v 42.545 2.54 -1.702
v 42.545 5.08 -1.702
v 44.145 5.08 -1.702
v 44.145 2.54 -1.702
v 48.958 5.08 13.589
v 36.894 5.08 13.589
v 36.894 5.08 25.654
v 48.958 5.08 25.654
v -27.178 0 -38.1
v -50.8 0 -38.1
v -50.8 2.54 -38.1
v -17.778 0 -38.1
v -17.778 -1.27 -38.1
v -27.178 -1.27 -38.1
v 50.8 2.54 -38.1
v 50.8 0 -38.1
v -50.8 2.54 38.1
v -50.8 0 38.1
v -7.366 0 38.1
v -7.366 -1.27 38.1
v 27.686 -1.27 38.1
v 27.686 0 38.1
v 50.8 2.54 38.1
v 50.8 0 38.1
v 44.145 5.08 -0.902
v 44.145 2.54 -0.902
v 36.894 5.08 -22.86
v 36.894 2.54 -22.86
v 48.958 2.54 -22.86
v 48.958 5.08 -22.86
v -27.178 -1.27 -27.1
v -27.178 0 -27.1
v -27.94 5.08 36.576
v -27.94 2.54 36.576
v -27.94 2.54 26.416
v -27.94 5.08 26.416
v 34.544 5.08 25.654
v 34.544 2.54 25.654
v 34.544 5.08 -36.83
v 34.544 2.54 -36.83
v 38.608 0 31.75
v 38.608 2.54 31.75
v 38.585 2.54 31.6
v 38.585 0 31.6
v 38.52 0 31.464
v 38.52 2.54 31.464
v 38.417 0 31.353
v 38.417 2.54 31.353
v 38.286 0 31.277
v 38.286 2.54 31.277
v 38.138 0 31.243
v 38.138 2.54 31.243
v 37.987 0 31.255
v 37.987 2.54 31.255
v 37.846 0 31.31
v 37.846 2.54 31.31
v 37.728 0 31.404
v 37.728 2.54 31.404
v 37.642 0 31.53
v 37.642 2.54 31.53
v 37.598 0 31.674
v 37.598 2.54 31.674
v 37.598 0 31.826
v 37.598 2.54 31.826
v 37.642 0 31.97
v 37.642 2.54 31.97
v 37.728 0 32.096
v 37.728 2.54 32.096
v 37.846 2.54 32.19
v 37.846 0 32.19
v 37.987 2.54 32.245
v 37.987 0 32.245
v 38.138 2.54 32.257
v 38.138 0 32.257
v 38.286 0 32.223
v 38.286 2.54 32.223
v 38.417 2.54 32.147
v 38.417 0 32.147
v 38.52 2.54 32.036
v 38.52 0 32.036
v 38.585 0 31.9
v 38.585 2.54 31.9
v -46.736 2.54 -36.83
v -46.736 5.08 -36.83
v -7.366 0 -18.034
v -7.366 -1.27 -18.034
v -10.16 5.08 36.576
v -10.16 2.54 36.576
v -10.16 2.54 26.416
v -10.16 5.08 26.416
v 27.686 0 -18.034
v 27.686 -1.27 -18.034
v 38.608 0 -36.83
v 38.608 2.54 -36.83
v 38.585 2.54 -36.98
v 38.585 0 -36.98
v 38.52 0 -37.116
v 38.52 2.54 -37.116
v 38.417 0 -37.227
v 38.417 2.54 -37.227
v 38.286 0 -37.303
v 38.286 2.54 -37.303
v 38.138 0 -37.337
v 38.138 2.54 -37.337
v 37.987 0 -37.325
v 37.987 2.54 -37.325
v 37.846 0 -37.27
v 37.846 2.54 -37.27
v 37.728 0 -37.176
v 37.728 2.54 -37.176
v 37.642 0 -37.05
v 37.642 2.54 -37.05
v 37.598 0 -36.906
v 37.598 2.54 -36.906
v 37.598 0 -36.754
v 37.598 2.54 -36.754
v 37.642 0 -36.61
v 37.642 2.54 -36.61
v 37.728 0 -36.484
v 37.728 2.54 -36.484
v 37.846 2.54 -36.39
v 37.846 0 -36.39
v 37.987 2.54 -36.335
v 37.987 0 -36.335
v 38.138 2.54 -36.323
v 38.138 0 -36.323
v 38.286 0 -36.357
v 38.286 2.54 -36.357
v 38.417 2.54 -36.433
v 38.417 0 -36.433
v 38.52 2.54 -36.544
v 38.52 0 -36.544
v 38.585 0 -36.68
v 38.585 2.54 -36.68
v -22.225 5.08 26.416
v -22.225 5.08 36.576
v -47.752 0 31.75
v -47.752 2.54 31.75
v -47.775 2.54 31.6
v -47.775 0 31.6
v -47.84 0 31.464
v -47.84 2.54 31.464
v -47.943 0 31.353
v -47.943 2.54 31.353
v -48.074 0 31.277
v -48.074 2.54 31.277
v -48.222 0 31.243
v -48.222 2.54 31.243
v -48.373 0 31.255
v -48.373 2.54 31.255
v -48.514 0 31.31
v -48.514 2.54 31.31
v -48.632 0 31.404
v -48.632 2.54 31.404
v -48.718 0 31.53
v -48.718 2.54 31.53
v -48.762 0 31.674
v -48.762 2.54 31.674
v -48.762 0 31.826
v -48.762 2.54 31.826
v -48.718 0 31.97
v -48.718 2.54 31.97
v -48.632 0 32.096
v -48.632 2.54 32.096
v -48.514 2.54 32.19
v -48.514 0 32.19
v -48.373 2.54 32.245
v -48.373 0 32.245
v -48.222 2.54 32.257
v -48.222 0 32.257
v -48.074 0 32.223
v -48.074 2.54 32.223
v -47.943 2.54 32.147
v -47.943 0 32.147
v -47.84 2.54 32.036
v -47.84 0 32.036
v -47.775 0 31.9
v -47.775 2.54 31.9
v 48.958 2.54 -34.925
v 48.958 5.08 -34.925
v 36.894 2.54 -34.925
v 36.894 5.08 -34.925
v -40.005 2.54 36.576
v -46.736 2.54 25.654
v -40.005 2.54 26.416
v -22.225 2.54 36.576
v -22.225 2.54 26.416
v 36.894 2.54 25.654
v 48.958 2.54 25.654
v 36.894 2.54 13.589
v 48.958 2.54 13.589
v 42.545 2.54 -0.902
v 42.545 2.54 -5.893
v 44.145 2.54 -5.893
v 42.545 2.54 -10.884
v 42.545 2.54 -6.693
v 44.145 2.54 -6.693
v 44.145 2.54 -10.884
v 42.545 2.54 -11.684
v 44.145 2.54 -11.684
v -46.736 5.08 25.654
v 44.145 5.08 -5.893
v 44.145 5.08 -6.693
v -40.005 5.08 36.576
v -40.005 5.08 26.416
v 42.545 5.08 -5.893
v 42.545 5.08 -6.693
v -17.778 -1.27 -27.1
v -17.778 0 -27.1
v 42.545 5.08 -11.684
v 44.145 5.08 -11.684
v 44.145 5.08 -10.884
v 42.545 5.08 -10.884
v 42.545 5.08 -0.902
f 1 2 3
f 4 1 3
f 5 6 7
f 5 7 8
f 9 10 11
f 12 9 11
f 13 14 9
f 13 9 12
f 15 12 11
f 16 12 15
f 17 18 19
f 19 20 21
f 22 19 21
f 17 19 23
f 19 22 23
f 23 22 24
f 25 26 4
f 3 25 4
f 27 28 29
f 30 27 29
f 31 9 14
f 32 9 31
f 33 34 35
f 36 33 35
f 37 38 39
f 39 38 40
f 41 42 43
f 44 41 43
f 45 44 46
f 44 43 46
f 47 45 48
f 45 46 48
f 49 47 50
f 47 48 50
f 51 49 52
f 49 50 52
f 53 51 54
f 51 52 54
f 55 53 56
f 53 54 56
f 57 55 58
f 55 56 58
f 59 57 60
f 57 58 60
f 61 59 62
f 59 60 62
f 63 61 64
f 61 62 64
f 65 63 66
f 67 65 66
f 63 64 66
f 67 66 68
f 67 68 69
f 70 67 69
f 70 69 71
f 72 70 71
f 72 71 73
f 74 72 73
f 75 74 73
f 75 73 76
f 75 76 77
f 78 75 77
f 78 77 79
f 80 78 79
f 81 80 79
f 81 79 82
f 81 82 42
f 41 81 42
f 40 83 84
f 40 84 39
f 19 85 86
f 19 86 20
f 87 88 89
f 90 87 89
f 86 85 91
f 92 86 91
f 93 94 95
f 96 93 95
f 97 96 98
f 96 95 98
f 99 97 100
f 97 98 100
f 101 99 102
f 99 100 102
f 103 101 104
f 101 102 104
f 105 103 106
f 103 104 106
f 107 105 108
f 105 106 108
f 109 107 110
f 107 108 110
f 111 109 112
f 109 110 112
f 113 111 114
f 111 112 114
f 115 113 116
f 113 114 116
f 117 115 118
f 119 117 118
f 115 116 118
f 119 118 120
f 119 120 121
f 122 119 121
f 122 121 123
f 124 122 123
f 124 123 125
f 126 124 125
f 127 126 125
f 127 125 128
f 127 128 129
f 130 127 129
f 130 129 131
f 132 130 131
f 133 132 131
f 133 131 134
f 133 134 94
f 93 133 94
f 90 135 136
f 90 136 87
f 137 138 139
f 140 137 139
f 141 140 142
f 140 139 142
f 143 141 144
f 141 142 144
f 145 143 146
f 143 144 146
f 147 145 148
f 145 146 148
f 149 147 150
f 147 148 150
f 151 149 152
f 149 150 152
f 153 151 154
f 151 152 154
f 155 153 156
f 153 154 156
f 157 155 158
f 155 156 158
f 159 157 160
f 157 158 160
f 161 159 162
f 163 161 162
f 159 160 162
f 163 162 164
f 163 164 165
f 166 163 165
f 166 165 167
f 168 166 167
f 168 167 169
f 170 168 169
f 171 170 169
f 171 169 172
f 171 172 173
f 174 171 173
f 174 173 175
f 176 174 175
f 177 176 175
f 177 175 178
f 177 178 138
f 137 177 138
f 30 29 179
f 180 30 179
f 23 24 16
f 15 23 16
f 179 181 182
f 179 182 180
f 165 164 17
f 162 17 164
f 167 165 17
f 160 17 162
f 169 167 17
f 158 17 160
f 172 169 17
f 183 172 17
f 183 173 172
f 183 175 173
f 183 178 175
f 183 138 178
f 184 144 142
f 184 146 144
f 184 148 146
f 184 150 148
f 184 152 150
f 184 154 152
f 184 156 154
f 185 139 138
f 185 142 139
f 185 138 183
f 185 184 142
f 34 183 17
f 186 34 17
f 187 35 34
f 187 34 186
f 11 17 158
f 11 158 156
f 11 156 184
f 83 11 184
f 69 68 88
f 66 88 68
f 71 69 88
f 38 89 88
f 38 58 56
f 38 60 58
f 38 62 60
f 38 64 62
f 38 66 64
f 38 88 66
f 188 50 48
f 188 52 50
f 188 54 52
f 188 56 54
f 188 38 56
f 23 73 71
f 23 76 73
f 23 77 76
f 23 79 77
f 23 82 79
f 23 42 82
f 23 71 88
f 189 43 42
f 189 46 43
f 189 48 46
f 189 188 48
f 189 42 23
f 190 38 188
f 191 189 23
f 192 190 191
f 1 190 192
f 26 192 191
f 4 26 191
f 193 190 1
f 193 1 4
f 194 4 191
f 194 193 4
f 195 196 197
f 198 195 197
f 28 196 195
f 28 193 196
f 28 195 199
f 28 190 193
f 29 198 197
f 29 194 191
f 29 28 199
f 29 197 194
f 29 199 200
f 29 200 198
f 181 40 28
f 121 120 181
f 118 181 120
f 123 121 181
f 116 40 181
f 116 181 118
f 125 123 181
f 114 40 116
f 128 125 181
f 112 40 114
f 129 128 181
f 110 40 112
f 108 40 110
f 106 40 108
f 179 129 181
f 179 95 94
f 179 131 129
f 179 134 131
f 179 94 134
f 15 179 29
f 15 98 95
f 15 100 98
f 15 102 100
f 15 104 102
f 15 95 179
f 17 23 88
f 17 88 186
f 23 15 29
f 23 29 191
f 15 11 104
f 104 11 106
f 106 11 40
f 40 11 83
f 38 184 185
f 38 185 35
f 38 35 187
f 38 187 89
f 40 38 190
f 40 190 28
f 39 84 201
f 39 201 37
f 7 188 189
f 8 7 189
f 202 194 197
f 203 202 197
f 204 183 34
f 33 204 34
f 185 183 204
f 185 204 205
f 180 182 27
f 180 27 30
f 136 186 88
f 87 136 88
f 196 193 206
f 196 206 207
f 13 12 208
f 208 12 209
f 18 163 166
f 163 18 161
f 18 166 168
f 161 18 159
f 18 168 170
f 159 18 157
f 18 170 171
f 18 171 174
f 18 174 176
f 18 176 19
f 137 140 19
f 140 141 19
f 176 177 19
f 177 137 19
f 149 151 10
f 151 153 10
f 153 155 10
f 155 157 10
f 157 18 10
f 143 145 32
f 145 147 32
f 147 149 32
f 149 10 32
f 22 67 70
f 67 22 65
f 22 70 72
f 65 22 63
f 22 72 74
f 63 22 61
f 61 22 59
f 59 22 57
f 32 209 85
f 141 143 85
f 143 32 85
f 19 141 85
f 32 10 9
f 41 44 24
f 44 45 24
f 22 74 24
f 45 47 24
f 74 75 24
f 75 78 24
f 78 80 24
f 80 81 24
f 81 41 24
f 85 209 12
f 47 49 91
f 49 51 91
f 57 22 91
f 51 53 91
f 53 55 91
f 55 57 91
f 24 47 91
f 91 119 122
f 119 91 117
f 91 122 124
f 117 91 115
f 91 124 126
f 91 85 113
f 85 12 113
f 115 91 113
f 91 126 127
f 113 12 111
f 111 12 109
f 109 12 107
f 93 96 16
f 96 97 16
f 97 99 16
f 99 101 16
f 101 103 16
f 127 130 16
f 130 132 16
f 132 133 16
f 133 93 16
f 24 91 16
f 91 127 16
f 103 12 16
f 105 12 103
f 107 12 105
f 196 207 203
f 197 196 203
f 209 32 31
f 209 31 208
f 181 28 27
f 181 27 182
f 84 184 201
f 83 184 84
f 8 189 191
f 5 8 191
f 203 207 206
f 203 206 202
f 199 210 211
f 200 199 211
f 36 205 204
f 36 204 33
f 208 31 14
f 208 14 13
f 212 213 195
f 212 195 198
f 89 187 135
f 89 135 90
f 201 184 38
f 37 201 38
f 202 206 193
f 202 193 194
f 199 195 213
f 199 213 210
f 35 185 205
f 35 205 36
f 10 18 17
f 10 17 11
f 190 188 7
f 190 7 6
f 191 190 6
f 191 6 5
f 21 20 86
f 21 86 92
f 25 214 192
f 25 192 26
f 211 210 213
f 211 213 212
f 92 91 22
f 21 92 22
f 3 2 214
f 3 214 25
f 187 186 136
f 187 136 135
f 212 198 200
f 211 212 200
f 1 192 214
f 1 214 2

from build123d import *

# Parameters (mm, degrees)
SKETCH1_W           = 101.6
SKETCH1_H           = 76.2
BOSS_EXTRUDE1_DEPTH = 2.54
SKETCH3_W           = 35.052
SKETCH3_H           = 56.134
SKETCH3_W_2         = 9.4
SKETCH3_H_2         = 11
BOSS_EXTRUDE4_DEPTH = 1.27
SKETCH2_W           = 1.6
SKETCH2_H           = 0.8
SKETCH2_W_2         = 81.28
SKETCH2_H_2         = 62.484
SKETCH2_W_3         = 12.065
SKETCH2_H_3         = 12.065
SKETCH2_H_4         = 10.16
BOSS_EXTRUDE5_DEPTH = 2.54
SKETCH2_3_R         = 0.508
CUT_EXTRUDE1_DEPTH  = 64.614197315


with BuildPart() as part:
    # Sketch1 → Boss-Extrude1 (new body)
    with BuildSketch(Plane(origin=(0, 0, 0), x_dir=(1, 0, 0), z_dir=(0, 1, 0))):
        Rectangle(SKETCH1_W, SKETCH1_H)
    extrude(amount=BOSS_EXTRUDE1_DEPTH)

    # Sketch3 → Boss-Extrude4 (add)
    with BuildSketch(Plane.XZ):
        with Locations((10.16, 10.033)):
            Rectangle(SKETCH3_W, SKETCH3_H)
        with Locations((-22.478, -32.6)):
            Rectangle(SKETCH3_W_2, SKETCH3_H_2)
    extrude(amount=BOSS_EXTRUDE4_DEPTH)

    # Sketch2 → Boss-Extrude5 (add)
    with BuildSketch(Plane(origin=(0, 2.54, 0), x_dir=(1, 0, 0), z_dir=(0, 1, 0))):
        with Locations((43.345, 6.293)):
            Rectangle(SKETCH2_W, SKETCH2_H)
        with Locations((-6.096, 5.588)):
            Rectangle(SKETCH2_W_2, SKETCH2_H_2)
        with Locations((42.926, 28.8925)):
            Rectangle(SKETCH2_W_3, SKETCH2_H_3)
        with Locations((42.926, -19.6215)):
            Rectangle(SKETCH2_W_3, SKETCH2_H_3)
        with Locations((43.345, 1.302)):
            Rectangle(SKETCH2_W, SKETCH2_H)
        with Locations((43.345, 11.284)):
            Rectangle(SKETCH2_W, SKETCH2_H)
        with Locations((-33.9725, -31.496)):
            Rectangle(SKETCH2_W_3, SKETCH2_H_4)
        with Locations((-16.1925, -31.496)):
            Rectangle(SKETCH2_W_3, SKETCH2_H_4)
    extrude(amount=BOSS_EXTRUDE5_DEPTH)

    # Sketch2<3> → Cut-Extrude1 (cut, through all)
    with BuildSketch(Plane(origin=(0, 2.54, 0), x_dir=(1, 0, 0), z_dir=(0, 1, 0))):
        with Locations((-48.26, -31.75)):
            Circle(SKETCH2_3_R)
        with Locations((38.1, 36.83)):
            Circle(SKETCH2_3_R)
        with Locations((38.1, -31.75)):
            Circle(SKETCH2_3_R)
    extrude(amount=-CUT_EXTRUDE1_DEPTH, mode=Mode.SUBTRACT)


solid = part.part
